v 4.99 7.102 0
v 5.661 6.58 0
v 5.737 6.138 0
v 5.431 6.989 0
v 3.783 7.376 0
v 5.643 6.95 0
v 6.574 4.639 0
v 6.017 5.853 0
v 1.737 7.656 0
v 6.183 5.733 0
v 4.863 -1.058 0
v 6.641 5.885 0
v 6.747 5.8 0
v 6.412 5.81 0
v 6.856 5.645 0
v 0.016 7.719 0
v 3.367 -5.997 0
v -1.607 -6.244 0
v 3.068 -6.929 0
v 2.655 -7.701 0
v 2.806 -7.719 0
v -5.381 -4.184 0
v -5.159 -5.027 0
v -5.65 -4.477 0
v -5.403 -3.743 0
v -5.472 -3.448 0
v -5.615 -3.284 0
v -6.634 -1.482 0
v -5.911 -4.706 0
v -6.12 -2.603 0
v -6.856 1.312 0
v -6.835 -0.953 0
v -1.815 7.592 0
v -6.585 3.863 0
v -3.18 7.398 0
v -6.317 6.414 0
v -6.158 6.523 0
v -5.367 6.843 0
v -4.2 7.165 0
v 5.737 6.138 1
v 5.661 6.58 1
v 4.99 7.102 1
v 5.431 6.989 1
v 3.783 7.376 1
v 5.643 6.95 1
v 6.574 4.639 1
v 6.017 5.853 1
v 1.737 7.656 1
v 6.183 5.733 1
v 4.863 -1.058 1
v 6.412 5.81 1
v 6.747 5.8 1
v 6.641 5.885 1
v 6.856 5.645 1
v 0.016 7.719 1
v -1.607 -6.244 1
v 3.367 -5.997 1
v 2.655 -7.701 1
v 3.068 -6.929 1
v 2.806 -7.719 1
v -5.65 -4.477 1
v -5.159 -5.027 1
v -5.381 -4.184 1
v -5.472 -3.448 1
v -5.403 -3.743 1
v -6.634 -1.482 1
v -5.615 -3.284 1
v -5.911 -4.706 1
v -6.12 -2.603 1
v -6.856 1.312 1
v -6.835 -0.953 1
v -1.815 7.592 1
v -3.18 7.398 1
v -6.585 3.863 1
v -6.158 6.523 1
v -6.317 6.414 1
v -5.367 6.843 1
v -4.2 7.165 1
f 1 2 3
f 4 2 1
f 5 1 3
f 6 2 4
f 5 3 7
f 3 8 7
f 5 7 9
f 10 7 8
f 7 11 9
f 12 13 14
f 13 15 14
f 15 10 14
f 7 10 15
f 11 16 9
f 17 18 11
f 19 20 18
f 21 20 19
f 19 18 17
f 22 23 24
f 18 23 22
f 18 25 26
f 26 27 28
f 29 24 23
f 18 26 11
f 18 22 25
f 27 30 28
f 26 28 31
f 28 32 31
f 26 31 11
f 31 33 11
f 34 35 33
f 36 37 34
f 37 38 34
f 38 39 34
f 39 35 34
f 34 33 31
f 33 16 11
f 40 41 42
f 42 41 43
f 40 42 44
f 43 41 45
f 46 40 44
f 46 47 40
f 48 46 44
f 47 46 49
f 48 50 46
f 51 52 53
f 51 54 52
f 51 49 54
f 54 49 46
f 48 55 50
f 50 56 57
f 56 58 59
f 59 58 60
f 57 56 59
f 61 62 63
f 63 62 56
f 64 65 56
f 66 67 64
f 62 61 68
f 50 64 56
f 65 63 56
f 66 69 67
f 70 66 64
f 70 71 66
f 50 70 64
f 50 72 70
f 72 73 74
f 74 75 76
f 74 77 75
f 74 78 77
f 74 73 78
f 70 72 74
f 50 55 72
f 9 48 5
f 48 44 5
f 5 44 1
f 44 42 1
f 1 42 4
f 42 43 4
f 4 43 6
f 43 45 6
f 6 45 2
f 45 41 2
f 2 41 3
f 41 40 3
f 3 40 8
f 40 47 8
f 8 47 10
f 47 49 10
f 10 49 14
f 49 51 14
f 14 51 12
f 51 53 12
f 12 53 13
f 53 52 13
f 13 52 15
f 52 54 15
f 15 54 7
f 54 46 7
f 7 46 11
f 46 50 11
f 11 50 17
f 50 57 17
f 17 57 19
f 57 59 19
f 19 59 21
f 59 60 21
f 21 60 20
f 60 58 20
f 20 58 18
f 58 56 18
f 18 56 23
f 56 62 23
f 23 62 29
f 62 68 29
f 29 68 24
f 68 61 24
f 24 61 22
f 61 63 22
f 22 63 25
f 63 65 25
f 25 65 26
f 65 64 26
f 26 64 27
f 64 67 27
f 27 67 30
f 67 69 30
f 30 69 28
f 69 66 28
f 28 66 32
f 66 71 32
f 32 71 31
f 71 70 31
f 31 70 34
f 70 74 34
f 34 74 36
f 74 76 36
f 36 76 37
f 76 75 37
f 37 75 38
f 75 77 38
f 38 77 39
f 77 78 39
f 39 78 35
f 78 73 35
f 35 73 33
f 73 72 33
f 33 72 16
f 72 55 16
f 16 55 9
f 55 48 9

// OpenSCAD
// Module names are of the form poly_<inkscape-path-id>().  As a result,
// you can associate a polygon in this OpenSCAD program with the corresponding
// SVG element in the Inkscape document by looking for the XML element with
// the attribute id="inkscape-path-id".

// fudge value is used to ensure that subtracted solids are a tad taller
// in the z dimension than the polygon being subtracted from.  This helps
// keep the resulting .stl file manifold.
fudge = 0.1;

module parte2(h)
{
  scale([25.4/90, -25.4/90, 1]) union()
  {
    linear_extrude(height=h)
      polygon([[0.056252,-27.350919],[-6.431466,-26.899341],[-11.269129,-26.213381],[-14.881750,-25.388353],[-19.016264,-24.246127],[-21.819483,-23.113277],[-22.382002,-22.725764],[-23.332034,-13.687960],[-24.294566,-4.650156],[-24.257065,-0.637521],[-24.219564,3.375113],[-23.507040,5.250176],[-21.686666,9.222185],[-19.894418,11.637891],[-19.388151,12.216035],[-19.144393,13.262946],[-19.066266,14.825498],[-20.019423,15.863033],[-20.944454,16.675560],[-18.278739,17.811536],[-5.693941,22.125743],[9.406566,27.288417],[9.944084,27.350919],[10.869115,24.550825],[11.931651,21.250714],[17.231829,3.750126],[23.294533,-16.438052],[24.294566,-20.000672],[23.907053,-20.550690],[23.532041,-20.850701],[22.719513,-20.588192],[21.906986,-20.313183],[21.319466,-20.738197],[20.327245,-21.749168],[20.056924,-23.313283],[19.994422,-24.625827],[19.244397,-24.763332],[17.681844,-25.163345],[13.405138,-26.135253],[6.156457,-27.125911],[0.056252,-27.350919]]);
  }
}

parte2(1);
